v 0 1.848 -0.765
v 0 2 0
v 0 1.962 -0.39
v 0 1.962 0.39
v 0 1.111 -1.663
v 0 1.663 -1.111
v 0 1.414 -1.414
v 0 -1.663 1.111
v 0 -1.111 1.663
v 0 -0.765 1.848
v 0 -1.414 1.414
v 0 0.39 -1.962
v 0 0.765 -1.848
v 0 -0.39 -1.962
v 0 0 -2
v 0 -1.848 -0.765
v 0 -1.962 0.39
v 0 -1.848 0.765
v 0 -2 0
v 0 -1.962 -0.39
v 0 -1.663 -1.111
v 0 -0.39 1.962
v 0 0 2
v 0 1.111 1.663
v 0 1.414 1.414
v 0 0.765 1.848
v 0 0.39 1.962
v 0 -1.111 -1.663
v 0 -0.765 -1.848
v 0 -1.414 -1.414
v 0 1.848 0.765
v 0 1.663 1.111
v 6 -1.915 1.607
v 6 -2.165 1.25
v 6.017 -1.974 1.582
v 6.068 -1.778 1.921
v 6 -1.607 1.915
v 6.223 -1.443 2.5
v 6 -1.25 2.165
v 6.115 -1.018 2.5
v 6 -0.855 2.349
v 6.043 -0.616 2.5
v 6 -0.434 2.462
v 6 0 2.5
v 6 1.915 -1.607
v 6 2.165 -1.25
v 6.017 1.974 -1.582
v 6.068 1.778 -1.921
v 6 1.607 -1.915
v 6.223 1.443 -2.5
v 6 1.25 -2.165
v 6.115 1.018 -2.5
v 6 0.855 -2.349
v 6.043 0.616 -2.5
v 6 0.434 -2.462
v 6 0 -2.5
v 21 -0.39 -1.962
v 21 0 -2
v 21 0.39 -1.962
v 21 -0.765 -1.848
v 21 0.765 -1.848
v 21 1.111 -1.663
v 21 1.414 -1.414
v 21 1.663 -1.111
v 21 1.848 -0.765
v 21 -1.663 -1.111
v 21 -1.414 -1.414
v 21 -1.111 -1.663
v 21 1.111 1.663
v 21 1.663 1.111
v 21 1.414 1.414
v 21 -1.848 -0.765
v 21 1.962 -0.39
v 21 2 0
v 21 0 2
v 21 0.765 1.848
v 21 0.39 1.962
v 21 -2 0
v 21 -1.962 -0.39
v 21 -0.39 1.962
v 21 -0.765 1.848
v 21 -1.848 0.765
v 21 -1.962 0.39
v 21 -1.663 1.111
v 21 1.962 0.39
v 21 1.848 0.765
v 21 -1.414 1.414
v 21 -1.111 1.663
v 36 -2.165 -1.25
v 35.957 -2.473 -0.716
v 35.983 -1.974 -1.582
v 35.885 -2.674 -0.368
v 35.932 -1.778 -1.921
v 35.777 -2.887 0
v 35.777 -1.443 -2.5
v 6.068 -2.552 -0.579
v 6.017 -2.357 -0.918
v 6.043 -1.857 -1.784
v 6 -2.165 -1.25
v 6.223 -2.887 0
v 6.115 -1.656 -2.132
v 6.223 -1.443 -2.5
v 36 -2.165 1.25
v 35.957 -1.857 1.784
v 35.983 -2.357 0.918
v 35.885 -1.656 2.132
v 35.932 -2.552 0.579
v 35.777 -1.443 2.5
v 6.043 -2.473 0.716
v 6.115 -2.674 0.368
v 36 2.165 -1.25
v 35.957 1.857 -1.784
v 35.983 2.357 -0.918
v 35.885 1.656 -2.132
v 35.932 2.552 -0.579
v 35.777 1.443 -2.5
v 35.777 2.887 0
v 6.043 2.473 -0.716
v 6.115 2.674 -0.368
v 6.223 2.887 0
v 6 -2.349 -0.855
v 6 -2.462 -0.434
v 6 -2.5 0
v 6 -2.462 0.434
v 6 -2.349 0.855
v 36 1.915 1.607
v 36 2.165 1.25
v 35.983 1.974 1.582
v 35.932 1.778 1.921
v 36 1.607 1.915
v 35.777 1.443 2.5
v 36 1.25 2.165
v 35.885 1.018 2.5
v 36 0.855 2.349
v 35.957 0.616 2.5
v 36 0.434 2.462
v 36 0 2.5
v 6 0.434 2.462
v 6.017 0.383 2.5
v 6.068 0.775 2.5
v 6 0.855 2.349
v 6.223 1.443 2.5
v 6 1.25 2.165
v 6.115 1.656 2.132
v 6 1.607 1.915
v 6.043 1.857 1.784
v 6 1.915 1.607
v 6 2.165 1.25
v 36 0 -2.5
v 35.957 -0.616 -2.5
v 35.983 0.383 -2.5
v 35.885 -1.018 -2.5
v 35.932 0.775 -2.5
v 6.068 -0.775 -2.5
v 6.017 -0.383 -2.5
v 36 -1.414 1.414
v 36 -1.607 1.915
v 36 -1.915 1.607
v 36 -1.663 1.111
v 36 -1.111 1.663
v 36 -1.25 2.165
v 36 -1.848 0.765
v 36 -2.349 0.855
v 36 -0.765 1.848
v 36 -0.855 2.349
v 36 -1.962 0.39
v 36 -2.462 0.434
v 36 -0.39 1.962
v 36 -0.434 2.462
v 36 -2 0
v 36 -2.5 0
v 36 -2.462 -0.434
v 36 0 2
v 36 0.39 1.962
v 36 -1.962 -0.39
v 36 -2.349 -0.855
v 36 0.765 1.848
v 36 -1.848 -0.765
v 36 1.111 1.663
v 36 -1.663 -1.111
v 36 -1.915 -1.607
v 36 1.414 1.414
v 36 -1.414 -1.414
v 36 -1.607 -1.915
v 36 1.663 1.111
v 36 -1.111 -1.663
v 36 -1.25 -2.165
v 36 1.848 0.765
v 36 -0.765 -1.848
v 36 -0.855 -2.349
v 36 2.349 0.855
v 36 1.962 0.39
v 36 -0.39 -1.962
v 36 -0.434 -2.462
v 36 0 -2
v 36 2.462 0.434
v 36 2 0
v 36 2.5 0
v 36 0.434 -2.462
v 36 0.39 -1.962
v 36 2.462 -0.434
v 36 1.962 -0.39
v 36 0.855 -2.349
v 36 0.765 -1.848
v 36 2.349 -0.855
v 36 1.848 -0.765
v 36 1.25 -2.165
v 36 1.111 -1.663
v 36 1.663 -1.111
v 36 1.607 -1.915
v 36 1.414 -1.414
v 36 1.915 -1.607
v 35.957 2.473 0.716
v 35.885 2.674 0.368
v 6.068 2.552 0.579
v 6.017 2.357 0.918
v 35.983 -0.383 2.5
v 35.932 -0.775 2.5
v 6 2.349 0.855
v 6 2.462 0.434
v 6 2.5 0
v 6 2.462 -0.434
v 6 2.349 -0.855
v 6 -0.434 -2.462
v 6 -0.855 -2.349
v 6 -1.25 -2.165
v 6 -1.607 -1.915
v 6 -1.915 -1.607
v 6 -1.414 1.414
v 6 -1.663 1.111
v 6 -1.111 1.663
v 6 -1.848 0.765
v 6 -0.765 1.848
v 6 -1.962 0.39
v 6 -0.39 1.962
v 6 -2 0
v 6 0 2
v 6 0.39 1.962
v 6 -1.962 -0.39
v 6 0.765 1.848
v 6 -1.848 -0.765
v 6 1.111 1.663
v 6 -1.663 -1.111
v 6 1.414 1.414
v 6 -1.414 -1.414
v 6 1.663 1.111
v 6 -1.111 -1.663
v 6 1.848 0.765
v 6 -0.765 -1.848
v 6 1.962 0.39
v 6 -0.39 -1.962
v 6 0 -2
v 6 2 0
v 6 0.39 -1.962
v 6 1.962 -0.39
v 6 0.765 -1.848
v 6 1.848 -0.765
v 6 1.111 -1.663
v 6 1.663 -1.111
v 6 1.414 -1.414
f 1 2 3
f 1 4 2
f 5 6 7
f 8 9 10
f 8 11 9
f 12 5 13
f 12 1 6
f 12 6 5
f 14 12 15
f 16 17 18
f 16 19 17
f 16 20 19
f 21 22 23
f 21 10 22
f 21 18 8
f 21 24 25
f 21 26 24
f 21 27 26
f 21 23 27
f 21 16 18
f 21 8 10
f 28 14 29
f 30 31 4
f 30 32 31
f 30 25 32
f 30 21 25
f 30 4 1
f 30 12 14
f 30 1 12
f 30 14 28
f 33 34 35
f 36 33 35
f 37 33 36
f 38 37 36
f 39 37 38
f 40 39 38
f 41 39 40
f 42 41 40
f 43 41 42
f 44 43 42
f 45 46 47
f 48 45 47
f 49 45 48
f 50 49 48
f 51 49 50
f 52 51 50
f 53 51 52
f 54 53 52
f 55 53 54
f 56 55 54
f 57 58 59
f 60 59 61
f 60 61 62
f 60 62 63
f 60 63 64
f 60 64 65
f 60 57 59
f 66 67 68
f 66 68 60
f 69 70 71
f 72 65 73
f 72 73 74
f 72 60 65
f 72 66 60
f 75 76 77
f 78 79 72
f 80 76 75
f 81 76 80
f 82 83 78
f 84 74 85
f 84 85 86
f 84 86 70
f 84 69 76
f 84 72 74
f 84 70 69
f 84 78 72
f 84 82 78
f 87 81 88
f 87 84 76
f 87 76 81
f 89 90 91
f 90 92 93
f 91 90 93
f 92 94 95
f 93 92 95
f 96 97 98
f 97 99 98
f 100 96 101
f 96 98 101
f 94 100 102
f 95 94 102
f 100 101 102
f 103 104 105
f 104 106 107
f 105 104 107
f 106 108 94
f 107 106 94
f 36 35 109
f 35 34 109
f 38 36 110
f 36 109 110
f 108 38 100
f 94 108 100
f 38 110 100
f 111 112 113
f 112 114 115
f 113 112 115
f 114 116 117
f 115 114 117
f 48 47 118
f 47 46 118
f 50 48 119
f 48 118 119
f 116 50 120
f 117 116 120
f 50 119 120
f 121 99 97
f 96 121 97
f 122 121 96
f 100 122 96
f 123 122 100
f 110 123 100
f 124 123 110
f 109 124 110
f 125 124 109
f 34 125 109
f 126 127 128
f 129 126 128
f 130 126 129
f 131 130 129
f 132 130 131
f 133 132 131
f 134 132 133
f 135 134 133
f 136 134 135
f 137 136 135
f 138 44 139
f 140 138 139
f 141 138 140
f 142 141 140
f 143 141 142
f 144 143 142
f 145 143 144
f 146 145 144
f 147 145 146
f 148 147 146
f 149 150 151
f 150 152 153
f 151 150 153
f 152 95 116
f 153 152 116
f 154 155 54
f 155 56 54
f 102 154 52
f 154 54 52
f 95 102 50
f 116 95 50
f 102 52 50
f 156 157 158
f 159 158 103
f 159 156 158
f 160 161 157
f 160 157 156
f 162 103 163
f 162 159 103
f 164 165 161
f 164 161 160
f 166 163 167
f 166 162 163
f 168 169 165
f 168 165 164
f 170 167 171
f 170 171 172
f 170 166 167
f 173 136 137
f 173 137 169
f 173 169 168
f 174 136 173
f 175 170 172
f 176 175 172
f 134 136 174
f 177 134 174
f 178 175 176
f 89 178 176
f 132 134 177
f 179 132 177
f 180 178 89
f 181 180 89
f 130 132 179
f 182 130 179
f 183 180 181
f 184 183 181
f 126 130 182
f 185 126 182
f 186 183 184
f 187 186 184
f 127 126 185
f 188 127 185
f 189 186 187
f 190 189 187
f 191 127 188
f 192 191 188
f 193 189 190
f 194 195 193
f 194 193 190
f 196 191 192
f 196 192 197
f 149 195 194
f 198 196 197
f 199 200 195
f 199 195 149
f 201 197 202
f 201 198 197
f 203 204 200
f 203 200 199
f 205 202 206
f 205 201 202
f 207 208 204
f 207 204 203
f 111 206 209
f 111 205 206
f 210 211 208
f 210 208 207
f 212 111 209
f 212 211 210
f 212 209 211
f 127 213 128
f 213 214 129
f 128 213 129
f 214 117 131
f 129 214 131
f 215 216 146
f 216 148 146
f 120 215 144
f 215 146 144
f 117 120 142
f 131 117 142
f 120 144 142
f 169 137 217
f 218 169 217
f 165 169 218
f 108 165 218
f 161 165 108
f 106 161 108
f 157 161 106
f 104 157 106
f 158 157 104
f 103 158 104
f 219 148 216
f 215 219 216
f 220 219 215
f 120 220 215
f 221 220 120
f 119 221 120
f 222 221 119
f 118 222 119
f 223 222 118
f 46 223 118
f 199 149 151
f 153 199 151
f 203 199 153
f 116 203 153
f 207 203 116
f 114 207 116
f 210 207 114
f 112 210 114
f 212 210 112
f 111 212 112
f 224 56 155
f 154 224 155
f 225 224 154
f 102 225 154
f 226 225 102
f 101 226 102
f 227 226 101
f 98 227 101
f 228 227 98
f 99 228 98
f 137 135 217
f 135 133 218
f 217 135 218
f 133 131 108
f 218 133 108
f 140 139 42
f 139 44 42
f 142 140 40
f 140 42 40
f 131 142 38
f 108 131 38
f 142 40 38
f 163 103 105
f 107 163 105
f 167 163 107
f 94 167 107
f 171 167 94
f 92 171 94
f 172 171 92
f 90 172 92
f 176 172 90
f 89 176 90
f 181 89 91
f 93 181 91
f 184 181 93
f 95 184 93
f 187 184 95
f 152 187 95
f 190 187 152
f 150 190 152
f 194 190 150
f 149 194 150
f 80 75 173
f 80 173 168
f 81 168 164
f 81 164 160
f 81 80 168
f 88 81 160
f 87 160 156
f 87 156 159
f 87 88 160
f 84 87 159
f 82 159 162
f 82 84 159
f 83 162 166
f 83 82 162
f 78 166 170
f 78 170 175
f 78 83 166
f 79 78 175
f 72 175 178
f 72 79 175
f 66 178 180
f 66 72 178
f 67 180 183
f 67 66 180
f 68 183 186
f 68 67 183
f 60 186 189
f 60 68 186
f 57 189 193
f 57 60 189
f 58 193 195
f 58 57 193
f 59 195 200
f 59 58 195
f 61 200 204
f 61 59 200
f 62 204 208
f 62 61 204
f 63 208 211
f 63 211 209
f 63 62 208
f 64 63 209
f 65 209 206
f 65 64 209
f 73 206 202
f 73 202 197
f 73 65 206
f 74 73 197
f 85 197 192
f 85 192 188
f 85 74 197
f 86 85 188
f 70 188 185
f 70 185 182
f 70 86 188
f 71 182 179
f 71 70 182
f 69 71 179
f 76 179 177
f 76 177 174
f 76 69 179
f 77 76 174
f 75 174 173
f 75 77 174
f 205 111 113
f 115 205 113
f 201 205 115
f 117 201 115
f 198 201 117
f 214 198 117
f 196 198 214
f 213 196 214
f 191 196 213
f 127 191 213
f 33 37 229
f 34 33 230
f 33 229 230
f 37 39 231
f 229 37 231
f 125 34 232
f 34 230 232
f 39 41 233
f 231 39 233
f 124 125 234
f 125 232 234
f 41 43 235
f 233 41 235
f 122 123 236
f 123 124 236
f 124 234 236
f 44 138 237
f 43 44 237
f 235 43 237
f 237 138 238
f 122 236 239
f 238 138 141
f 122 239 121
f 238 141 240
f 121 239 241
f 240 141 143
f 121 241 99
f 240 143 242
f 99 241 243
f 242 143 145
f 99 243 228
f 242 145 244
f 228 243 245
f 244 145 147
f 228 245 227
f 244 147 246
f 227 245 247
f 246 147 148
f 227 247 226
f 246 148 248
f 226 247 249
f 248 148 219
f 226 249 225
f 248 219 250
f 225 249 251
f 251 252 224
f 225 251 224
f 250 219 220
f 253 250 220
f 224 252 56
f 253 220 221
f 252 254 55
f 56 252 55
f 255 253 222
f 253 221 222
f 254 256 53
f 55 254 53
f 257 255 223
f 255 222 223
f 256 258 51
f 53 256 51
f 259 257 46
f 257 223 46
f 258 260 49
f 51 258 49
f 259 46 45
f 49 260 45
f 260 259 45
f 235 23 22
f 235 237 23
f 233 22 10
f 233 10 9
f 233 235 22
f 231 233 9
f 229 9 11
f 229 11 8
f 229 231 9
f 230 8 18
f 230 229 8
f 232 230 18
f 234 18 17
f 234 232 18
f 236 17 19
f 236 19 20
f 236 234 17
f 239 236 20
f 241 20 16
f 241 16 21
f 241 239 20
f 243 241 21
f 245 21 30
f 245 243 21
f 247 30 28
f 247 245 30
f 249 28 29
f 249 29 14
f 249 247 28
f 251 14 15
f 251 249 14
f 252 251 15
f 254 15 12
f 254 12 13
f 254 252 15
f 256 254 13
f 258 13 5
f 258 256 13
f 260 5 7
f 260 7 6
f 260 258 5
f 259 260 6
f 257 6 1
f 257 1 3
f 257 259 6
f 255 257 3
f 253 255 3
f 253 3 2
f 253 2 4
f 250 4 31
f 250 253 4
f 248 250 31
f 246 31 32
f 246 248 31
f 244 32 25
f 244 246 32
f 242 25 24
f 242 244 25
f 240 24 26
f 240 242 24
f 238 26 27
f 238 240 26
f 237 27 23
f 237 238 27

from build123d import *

# Parameters (mm, degrees)
EXTRUDE_START       = 6
EXTRUDE_1_DEPTH     = 30
SKETCH_4_R          = 32
SKETCH_4_R_2        = 2.5
CUT_EXTRUDE_1_DEPTH = 2
CUT_EXTRUDE_1_DRAFT = -60
SKETCH_5_R          = 32
SKETCH_5_R_2        = 2.5
CUT_EXTRUDE_2_DEPTH = 2
CUT_EXTRUDE_2_DRAFT = -60
SKETCH_6_W          = 6
SKETCH_6_H          = 2
EXTRUDE1_START      = -15
SKETCH1_R           = 2
EXTRUDE1_DEPTH      = 15


with BuildPart() as part:
    # 草图3 → 凸台-拉伸1 (new body)
    with BuildSketch(Plane(origin=(0, 0, 0), x_dir=(0, 0, -1), z_dir=(1, 0, 0)).offset(EXTRUDE_START)):
        Polygon((2.5, 1.443375673), (0, 2.886751346), (-2.5, 1.443375673), (-2.5, -1.443375673), (0, -2.886751346), (2.5, -1.443375673), align=None)
    extrude(amount=EXTRUDE_1_DEPTH)


with BuildPart() as cut_extrude_1_tool:
    # 草图4 → 切除-拉伸1 (with draft: the straight prism first)
    with BuildSketch(Plane.ZY.offset(-6)):
        Circle(SKETCH_4_R)
        Circle(SKETCH_4_R_2, mode=Mode.SUBTRACT)
    extrude(amount=-CUT_EXTRUDE_1_DEPTH)
    # 切除-拉伸1: the draft: its side faces are tilted about the plane it starts from
    cut_extrude_1_sides = [cut_extrude_1_tool.faces().sort_by_distance(p)[0] for p in [
        (7, 0, -32),
        (7, 0, -2.5),
    ]]
    draft(cut_extrude_1_sides, Plane.ZY.offset(-6), CUT_EXTRUDE_1_DRAFT)


with BuildPart() as part_1:
    add(part.part)

    # 切除-拉伸1: cut by cut_extrude_1_tool
    add(cut_extrude_1_tool.part, mode=Mode.SUBTRACT)


with BuildPart() as cut_extrude_2_tool:
    # 草图5 → 切除-拉伸2 (with draft: the straight prism first)
    with BuildSketch(Plane(origin=(36, 0, 0), x_dir=(0, 0, -1), z_dir=(1, 0, 0))):
        Circle(SKETCH_5_R)
        Circle(SKETCH_5_R_2, mode=Mode.SUBTRACT)
    extrude(amount=-CUT_EXTRUDE_2_DEPTH)
    # 切除-拉伸2: the draft: its side faces are tilted about the plane it starts from
    cut_extrude_2_sides = [cut_extrude_2_tool.faces().sort_by_distance(p)[0] for p in [
        (35, 0, 32),
        (35, 0, 2.5),
    ]]
    draft(cut_extrude_2_sides, Plane(origin=(36, 0, 0), x_dir=(0, 0, -1), z_dir=(1, 0, 0)), CUT_EXTRUDE_2_DRAFT)


with BuildPart() as part_2:
    add(part_1.part)

    # 切除-拉伸2: cut by cut_extrude_2_tool
    add(cut_extrude_2_tool.part, mode=Mode.SUBTRACT)

    # 草图6 → 旋转1 (revolve)
    with BuildSketch(Plane.XY, mode=Mode.PRIVATE) as revolve_1_sk:
        with Locations((3, 1)):
            Rectangle(SKETCH_6_W, SKETCH_6_H)
    revolve(revolve_1_sk.sketch.rotate(Axis((0, 0, 0), (1, 0, 0)), 90), axis=Axis((0, 0, 0), (1, 0, 0)))

    # Sketch1 → Extrude1 (cut)
    with BuildSketch(Plane(origin=(36, 0, 0), x_dir=(0, 0, -1), z_dir=(1, 0, 0)).offset(EXTRUDE1_START)):
        with Locations(Location((0, 0, 0), (0, 0, 180))):
            Circle(SKETCH1_R)
    extrude(amount=EXTRUDE1_DEPTH, mode=Mode.SUBTRACT)


solid = part_2.part
